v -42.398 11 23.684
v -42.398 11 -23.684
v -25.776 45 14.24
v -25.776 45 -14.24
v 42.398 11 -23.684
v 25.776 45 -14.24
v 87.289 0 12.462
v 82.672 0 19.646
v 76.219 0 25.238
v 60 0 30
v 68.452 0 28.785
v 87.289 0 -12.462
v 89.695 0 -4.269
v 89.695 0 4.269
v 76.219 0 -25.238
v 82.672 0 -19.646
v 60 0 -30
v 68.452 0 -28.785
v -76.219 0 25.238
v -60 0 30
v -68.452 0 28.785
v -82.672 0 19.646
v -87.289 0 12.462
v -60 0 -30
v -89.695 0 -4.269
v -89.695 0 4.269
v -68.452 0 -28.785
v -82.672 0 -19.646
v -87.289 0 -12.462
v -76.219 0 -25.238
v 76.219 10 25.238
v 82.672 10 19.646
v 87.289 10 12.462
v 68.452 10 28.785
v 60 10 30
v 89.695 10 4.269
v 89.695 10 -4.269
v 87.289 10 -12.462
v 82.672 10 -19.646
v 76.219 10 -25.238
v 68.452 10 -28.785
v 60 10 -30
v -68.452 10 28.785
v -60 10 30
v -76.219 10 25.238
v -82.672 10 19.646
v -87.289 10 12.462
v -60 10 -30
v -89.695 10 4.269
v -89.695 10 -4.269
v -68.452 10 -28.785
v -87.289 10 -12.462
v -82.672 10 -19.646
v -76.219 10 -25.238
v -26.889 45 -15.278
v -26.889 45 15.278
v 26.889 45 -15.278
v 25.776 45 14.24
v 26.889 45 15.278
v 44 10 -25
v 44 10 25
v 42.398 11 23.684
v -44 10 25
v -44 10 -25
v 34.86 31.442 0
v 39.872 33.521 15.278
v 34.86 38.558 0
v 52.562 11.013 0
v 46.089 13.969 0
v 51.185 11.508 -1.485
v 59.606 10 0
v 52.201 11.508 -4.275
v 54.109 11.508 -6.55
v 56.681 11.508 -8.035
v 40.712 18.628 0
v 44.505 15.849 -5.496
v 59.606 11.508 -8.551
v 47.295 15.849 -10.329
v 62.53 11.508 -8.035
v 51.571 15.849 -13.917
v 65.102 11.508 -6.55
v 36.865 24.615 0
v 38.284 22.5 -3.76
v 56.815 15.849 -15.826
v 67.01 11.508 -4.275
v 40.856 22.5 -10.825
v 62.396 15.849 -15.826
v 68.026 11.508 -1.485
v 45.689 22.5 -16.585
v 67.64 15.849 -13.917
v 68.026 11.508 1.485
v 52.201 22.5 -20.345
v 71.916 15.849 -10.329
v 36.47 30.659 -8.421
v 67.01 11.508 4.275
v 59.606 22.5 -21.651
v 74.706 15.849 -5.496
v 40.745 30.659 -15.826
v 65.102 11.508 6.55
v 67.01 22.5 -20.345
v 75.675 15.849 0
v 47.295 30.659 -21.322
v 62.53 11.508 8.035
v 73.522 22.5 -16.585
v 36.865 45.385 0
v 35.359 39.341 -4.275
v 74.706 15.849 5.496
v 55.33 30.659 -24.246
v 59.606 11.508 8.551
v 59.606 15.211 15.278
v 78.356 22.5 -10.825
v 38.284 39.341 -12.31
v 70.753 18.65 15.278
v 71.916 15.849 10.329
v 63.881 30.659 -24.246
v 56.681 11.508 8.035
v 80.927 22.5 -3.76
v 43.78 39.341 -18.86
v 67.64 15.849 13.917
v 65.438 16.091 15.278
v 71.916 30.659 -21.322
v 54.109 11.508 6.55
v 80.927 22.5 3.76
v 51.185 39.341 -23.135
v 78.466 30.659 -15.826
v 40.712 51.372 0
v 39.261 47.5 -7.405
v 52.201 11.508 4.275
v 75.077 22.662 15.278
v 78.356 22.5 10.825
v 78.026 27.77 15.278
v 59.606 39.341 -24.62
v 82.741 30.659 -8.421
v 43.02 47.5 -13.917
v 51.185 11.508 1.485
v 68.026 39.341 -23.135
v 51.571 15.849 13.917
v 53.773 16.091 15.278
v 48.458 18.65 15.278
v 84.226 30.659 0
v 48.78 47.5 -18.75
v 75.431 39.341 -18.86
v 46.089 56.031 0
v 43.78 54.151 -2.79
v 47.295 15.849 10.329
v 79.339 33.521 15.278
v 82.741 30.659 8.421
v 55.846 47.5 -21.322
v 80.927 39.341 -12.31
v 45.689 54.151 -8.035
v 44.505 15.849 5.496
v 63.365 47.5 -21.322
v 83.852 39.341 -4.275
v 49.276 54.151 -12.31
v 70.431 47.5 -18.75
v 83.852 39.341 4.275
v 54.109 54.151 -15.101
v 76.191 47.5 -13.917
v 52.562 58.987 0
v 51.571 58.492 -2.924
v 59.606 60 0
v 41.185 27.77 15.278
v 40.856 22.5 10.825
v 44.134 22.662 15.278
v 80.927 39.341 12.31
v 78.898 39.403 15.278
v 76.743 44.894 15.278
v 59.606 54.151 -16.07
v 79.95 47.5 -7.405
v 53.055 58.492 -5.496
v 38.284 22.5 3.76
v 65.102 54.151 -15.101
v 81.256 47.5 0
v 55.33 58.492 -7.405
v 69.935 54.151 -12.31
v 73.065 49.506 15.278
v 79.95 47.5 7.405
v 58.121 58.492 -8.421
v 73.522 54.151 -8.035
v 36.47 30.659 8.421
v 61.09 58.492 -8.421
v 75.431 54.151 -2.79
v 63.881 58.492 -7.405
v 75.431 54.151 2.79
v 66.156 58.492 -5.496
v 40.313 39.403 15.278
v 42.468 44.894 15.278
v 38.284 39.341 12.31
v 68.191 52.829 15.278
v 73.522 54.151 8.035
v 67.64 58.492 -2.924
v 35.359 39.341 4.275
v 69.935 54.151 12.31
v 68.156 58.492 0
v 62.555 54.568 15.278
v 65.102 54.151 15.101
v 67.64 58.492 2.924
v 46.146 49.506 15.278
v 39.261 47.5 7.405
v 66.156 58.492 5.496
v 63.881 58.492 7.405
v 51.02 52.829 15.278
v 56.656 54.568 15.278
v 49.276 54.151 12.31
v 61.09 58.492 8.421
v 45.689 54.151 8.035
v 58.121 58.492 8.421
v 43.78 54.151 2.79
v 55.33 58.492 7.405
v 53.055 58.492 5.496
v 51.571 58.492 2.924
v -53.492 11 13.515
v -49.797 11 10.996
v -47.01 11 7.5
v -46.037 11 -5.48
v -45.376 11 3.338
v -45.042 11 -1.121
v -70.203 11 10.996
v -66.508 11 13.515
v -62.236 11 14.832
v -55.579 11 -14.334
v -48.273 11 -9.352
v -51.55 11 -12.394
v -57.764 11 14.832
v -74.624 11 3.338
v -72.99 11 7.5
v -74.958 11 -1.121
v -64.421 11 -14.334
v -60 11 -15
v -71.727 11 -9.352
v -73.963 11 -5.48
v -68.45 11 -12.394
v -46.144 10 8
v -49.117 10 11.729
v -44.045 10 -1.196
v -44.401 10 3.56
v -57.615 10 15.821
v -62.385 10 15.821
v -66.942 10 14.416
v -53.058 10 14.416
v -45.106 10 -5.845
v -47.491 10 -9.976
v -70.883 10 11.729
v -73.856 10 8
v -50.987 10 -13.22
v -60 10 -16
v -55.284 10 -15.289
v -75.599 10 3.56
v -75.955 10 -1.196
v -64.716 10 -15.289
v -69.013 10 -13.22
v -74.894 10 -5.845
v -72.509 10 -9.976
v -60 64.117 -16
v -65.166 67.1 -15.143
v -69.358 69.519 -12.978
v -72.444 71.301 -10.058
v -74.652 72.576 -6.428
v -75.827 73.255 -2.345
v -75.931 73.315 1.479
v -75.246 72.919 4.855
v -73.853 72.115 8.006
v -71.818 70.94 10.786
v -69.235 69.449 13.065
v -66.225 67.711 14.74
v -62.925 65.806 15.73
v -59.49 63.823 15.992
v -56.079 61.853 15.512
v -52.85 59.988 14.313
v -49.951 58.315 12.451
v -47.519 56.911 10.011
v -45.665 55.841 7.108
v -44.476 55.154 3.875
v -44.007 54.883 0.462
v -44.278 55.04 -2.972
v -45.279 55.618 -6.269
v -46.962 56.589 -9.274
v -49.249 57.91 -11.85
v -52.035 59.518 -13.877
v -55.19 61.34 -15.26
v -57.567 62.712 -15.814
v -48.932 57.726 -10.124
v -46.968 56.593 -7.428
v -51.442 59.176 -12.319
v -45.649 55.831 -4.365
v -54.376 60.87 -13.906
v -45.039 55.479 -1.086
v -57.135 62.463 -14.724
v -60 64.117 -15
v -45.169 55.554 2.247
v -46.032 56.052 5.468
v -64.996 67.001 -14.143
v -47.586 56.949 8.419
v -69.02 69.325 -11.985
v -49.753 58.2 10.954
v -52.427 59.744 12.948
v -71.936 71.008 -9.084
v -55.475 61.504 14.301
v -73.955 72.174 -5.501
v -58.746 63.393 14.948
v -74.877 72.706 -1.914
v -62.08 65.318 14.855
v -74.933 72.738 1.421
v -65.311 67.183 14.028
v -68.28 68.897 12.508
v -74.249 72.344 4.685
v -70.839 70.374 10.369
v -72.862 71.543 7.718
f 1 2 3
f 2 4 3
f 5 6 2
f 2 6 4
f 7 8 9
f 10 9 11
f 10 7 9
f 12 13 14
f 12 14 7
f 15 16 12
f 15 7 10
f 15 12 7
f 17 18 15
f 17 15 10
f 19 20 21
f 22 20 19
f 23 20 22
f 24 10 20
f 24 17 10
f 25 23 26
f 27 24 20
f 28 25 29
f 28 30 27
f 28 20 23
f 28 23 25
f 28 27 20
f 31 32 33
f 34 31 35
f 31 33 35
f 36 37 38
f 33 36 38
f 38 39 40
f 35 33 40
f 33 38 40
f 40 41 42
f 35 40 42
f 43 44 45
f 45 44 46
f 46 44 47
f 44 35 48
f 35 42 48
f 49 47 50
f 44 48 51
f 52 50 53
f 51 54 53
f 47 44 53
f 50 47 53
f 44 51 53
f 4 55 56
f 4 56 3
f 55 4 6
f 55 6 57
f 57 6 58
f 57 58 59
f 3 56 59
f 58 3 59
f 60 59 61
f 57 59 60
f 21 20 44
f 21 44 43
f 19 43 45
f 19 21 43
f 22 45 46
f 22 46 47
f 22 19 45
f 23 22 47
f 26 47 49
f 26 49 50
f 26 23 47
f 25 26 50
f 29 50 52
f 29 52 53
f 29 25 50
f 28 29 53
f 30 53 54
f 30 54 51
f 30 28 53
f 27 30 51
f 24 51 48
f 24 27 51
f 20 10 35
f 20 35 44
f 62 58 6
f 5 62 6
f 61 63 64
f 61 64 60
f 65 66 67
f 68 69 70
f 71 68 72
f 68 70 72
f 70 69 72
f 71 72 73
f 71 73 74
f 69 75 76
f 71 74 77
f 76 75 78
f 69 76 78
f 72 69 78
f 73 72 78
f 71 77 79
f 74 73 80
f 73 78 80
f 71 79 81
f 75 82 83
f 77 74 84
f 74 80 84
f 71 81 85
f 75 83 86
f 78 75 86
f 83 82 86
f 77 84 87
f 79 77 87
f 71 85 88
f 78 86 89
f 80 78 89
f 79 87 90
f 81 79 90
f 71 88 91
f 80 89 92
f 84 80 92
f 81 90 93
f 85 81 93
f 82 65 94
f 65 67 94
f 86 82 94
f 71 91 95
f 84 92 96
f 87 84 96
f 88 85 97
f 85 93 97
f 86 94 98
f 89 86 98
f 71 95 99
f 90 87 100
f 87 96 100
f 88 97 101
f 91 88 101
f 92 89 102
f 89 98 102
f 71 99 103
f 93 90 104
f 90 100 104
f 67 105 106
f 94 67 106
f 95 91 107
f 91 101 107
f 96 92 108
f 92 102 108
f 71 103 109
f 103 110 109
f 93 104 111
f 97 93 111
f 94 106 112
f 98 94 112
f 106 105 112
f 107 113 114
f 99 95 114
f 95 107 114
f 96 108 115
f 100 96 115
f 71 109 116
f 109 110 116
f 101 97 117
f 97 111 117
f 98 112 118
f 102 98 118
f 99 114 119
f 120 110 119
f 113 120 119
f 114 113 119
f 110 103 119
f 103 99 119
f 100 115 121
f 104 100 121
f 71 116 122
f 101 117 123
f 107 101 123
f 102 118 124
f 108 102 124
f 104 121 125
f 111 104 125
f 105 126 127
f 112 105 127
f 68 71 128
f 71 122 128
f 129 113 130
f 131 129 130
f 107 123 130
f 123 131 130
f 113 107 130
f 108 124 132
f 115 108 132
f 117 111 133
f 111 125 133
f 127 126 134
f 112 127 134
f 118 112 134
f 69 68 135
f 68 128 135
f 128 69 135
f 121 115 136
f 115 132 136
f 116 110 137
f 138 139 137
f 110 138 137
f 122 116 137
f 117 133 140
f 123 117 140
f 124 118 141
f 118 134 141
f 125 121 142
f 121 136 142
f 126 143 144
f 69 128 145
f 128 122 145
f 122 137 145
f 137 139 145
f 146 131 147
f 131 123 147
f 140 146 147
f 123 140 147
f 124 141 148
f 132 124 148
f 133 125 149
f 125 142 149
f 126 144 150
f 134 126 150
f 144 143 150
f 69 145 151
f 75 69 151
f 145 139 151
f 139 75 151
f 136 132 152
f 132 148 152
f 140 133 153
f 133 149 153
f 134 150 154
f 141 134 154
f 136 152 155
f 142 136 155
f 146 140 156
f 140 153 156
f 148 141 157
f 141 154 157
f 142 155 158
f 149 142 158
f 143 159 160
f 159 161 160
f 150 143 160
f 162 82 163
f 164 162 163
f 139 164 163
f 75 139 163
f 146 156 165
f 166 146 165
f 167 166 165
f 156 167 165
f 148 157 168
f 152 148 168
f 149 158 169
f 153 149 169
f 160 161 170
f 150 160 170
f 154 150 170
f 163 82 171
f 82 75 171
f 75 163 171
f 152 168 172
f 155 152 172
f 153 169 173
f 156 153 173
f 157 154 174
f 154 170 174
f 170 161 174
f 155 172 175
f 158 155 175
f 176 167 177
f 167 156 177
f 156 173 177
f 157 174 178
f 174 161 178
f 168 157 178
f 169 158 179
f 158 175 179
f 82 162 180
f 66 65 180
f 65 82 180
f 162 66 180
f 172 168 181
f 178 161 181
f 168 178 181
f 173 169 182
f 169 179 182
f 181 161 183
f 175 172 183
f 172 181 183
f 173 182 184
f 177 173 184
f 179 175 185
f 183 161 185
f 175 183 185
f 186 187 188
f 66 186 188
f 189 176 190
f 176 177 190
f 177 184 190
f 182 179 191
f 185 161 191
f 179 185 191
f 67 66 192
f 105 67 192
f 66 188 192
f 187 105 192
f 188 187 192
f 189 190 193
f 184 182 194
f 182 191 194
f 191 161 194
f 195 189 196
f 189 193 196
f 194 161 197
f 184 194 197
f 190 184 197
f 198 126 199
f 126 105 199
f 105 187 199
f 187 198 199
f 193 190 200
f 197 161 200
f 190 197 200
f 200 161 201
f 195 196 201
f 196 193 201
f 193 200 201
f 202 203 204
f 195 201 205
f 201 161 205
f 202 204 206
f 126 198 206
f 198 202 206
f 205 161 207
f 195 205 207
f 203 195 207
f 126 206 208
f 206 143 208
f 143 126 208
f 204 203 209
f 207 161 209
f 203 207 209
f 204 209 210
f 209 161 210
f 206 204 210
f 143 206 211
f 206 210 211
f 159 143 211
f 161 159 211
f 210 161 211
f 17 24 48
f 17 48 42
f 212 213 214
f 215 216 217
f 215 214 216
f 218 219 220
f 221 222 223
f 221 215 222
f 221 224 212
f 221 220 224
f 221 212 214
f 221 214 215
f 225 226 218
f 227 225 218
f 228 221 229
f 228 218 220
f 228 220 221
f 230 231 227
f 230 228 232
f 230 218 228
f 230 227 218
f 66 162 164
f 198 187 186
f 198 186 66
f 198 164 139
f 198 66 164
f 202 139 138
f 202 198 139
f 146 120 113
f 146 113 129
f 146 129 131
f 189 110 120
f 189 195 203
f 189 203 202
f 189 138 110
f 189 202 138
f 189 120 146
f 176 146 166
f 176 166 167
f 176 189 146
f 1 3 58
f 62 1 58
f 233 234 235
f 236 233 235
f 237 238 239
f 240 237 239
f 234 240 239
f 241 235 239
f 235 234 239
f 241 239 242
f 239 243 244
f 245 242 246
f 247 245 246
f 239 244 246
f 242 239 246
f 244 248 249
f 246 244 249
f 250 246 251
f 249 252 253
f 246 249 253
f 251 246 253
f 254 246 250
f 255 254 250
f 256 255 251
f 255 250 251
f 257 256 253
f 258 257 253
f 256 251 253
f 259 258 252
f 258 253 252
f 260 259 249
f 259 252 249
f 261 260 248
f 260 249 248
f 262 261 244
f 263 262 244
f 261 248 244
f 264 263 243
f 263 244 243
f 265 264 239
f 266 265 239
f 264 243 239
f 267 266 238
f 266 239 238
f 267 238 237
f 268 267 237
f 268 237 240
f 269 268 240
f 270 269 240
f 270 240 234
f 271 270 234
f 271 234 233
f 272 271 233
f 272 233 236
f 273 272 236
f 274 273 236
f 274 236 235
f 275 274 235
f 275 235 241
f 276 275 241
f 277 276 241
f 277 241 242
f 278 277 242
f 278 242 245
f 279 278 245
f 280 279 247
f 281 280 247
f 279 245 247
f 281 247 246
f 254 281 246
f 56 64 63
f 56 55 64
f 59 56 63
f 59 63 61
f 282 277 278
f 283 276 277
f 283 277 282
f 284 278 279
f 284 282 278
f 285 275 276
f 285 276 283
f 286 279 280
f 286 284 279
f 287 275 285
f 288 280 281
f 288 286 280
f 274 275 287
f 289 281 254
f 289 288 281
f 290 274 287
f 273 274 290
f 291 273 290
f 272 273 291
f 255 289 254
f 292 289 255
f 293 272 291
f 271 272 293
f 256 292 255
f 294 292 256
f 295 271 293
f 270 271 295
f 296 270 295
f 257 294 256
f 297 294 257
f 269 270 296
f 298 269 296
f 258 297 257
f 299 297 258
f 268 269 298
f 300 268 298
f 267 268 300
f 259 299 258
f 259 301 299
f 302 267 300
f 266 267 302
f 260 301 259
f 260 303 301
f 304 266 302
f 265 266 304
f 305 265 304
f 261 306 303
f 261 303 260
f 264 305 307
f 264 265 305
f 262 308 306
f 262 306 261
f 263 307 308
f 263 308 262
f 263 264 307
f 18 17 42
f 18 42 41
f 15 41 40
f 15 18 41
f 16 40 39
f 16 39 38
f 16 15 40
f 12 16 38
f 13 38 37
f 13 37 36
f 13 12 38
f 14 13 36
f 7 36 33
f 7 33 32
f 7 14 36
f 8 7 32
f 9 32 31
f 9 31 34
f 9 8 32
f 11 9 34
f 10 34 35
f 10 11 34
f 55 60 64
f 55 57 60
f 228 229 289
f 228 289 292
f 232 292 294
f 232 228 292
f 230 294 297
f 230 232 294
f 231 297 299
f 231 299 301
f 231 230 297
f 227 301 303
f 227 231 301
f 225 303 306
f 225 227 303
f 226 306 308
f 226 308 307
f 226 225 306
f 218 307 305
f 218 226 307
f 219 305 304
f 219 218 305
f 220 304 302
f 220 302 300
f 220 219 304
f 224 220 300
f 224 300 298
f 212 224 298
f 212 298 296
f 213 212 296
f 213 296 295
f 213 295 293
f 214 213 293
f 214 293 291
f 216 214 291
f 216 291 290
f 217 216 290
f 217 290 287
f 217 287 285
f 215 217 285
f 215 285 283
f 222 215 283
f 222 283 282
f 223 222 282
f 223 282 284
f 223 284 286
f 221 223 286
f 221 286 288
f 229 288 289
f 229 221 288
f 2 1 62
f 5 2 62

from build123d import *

# Parameters (mm, degrees)
EXTRUDE1_DEPTH = 10
SKETCH2_W      = 88
SKETCH2_H      = 50
SKETCH4_W      = 84.491556584
SKETCH4_H      = 62.317301915
EXTRUDE2_DEPTH = 25
SHELL1_T       = -1
SKETCH5_R      = 16
EXTRUDE3_DEPTH = 90
EXTRUDE4_DEPTH = 45
SHELL2_T       = -1
SKETCH10_R     = 25
EXTRUDE5_DEPTH = 90


with BuildPart() as part:
    # Sketch1 → Extrude1 (new body)
    with BuildSketch(Plane(origin=(0, 0, 0), x_dir=(1, 0, 0), z_dir=(0, 1, 0))):
        with BuildLine():
            Line((-60, 30), (60, 30))
            ThreePointArc((60, 30), (90, 0), (60, -30))
            Line((60, -30), (-60, -30))
            ThreePointArc((-60, -30), (-90, 0), (-60, 30))
        make_face()
    extrude(amount=EXTRUDE1_DEPTH)


with BuildPart() as body_2:
    # Sketch2 → Loft1 section 0
    with BuildSketch(Plane(origin=(0, 10, 0), x_dir=(1, 0, 0), z_dir=(0, 1, 0)), mode=Mode.PRIVATE) as loft1_s0:
        Rectangle(SKETCH2_W, SKETCH2_H)
    loft([loft1_s0.sketch, Vertex(0, 100, 0)])

    # Sketch4 → Extrude2 (cut, symmetric)
    with BuildSketch(Plane.XY):
        with Locations((-4.205462092, 76.158650958)):
            Rectangle(SKETCH4_W, SKETCH4_H)
    extrude(amount=EXTRUDE2_DEPTH, both=True, mode=Mode.SUBTRACT)

    # Shell1
    shell1_openings = [body_2.faces().sort_by_distance(p)[0] for p in [
        (0, 45, 0),
    ]]
    offset(amount=SHELL1_T, openings=shell1_openings, kind=Kind.INTERSECTION)


with BuildPart() as body_3:
    # Sketch5 → Extrude3 (new body)
    with BuildSketch(Plane(origin=(0, 10, 0), x_dir=(1, 0, 0), z_dir=(0, 1, 0))):
        with Locations(Location((-60, 0, 0), (0, 0, 90))):
            Circle(SKETCH5_R)
    extrude(amount=EXTRUDE3_DEPTH)

    # Sketch7 → Extrude4 (cut, symmetric)
    with BuildSketch(Plane.XY):
        Polygon((-26.888888889, 45), (-97.326267404, 85.667039446), (-97.326267404, 110.899812001), (-26.888888889, 110.899812001), align=None)
    extrude(amount=EXTRUDE4_DEPTH, both=True, mode=Mode.SUBTRACT)

    # Shell2
    shell2_openings = [body_3.faces().sort_by_distance(p)[0] for p in [
        (-60, 64.116708913, 0),
    ]]
    offset(amount=SHELL2_T, openings=shell2_openings, kind=Kind.INTERSECTION)


with BuildPart() as body_4:
    # Sketch8 → Revolve1 (revolve)
    with BuildSketch(Plane.XY):
        with BuildLine():
            Line((59.605510636, 60), (59.605510636, 10))
            ThreePointArc((59.605510636, 10), (34.605510636, 35), (59.605510636, 60))
        make_face()
    revolve(axis=Axis((59.605510636, 60, 0), (0, -1, 0)))

    # Sketch10 → Extrude5 (cut)
    with BuildSketch(Plane.XY.offset(15.277777778)):
        with Locations((59.605510636, 35)):
            Circle(SKETCH10_R)
    extrude(amount=EXTRUDE5_DEPTH, mode=Mode.SUBTRACT)


solid = Compound([part.part, body_2.part, body_3.part, body_4.part])
